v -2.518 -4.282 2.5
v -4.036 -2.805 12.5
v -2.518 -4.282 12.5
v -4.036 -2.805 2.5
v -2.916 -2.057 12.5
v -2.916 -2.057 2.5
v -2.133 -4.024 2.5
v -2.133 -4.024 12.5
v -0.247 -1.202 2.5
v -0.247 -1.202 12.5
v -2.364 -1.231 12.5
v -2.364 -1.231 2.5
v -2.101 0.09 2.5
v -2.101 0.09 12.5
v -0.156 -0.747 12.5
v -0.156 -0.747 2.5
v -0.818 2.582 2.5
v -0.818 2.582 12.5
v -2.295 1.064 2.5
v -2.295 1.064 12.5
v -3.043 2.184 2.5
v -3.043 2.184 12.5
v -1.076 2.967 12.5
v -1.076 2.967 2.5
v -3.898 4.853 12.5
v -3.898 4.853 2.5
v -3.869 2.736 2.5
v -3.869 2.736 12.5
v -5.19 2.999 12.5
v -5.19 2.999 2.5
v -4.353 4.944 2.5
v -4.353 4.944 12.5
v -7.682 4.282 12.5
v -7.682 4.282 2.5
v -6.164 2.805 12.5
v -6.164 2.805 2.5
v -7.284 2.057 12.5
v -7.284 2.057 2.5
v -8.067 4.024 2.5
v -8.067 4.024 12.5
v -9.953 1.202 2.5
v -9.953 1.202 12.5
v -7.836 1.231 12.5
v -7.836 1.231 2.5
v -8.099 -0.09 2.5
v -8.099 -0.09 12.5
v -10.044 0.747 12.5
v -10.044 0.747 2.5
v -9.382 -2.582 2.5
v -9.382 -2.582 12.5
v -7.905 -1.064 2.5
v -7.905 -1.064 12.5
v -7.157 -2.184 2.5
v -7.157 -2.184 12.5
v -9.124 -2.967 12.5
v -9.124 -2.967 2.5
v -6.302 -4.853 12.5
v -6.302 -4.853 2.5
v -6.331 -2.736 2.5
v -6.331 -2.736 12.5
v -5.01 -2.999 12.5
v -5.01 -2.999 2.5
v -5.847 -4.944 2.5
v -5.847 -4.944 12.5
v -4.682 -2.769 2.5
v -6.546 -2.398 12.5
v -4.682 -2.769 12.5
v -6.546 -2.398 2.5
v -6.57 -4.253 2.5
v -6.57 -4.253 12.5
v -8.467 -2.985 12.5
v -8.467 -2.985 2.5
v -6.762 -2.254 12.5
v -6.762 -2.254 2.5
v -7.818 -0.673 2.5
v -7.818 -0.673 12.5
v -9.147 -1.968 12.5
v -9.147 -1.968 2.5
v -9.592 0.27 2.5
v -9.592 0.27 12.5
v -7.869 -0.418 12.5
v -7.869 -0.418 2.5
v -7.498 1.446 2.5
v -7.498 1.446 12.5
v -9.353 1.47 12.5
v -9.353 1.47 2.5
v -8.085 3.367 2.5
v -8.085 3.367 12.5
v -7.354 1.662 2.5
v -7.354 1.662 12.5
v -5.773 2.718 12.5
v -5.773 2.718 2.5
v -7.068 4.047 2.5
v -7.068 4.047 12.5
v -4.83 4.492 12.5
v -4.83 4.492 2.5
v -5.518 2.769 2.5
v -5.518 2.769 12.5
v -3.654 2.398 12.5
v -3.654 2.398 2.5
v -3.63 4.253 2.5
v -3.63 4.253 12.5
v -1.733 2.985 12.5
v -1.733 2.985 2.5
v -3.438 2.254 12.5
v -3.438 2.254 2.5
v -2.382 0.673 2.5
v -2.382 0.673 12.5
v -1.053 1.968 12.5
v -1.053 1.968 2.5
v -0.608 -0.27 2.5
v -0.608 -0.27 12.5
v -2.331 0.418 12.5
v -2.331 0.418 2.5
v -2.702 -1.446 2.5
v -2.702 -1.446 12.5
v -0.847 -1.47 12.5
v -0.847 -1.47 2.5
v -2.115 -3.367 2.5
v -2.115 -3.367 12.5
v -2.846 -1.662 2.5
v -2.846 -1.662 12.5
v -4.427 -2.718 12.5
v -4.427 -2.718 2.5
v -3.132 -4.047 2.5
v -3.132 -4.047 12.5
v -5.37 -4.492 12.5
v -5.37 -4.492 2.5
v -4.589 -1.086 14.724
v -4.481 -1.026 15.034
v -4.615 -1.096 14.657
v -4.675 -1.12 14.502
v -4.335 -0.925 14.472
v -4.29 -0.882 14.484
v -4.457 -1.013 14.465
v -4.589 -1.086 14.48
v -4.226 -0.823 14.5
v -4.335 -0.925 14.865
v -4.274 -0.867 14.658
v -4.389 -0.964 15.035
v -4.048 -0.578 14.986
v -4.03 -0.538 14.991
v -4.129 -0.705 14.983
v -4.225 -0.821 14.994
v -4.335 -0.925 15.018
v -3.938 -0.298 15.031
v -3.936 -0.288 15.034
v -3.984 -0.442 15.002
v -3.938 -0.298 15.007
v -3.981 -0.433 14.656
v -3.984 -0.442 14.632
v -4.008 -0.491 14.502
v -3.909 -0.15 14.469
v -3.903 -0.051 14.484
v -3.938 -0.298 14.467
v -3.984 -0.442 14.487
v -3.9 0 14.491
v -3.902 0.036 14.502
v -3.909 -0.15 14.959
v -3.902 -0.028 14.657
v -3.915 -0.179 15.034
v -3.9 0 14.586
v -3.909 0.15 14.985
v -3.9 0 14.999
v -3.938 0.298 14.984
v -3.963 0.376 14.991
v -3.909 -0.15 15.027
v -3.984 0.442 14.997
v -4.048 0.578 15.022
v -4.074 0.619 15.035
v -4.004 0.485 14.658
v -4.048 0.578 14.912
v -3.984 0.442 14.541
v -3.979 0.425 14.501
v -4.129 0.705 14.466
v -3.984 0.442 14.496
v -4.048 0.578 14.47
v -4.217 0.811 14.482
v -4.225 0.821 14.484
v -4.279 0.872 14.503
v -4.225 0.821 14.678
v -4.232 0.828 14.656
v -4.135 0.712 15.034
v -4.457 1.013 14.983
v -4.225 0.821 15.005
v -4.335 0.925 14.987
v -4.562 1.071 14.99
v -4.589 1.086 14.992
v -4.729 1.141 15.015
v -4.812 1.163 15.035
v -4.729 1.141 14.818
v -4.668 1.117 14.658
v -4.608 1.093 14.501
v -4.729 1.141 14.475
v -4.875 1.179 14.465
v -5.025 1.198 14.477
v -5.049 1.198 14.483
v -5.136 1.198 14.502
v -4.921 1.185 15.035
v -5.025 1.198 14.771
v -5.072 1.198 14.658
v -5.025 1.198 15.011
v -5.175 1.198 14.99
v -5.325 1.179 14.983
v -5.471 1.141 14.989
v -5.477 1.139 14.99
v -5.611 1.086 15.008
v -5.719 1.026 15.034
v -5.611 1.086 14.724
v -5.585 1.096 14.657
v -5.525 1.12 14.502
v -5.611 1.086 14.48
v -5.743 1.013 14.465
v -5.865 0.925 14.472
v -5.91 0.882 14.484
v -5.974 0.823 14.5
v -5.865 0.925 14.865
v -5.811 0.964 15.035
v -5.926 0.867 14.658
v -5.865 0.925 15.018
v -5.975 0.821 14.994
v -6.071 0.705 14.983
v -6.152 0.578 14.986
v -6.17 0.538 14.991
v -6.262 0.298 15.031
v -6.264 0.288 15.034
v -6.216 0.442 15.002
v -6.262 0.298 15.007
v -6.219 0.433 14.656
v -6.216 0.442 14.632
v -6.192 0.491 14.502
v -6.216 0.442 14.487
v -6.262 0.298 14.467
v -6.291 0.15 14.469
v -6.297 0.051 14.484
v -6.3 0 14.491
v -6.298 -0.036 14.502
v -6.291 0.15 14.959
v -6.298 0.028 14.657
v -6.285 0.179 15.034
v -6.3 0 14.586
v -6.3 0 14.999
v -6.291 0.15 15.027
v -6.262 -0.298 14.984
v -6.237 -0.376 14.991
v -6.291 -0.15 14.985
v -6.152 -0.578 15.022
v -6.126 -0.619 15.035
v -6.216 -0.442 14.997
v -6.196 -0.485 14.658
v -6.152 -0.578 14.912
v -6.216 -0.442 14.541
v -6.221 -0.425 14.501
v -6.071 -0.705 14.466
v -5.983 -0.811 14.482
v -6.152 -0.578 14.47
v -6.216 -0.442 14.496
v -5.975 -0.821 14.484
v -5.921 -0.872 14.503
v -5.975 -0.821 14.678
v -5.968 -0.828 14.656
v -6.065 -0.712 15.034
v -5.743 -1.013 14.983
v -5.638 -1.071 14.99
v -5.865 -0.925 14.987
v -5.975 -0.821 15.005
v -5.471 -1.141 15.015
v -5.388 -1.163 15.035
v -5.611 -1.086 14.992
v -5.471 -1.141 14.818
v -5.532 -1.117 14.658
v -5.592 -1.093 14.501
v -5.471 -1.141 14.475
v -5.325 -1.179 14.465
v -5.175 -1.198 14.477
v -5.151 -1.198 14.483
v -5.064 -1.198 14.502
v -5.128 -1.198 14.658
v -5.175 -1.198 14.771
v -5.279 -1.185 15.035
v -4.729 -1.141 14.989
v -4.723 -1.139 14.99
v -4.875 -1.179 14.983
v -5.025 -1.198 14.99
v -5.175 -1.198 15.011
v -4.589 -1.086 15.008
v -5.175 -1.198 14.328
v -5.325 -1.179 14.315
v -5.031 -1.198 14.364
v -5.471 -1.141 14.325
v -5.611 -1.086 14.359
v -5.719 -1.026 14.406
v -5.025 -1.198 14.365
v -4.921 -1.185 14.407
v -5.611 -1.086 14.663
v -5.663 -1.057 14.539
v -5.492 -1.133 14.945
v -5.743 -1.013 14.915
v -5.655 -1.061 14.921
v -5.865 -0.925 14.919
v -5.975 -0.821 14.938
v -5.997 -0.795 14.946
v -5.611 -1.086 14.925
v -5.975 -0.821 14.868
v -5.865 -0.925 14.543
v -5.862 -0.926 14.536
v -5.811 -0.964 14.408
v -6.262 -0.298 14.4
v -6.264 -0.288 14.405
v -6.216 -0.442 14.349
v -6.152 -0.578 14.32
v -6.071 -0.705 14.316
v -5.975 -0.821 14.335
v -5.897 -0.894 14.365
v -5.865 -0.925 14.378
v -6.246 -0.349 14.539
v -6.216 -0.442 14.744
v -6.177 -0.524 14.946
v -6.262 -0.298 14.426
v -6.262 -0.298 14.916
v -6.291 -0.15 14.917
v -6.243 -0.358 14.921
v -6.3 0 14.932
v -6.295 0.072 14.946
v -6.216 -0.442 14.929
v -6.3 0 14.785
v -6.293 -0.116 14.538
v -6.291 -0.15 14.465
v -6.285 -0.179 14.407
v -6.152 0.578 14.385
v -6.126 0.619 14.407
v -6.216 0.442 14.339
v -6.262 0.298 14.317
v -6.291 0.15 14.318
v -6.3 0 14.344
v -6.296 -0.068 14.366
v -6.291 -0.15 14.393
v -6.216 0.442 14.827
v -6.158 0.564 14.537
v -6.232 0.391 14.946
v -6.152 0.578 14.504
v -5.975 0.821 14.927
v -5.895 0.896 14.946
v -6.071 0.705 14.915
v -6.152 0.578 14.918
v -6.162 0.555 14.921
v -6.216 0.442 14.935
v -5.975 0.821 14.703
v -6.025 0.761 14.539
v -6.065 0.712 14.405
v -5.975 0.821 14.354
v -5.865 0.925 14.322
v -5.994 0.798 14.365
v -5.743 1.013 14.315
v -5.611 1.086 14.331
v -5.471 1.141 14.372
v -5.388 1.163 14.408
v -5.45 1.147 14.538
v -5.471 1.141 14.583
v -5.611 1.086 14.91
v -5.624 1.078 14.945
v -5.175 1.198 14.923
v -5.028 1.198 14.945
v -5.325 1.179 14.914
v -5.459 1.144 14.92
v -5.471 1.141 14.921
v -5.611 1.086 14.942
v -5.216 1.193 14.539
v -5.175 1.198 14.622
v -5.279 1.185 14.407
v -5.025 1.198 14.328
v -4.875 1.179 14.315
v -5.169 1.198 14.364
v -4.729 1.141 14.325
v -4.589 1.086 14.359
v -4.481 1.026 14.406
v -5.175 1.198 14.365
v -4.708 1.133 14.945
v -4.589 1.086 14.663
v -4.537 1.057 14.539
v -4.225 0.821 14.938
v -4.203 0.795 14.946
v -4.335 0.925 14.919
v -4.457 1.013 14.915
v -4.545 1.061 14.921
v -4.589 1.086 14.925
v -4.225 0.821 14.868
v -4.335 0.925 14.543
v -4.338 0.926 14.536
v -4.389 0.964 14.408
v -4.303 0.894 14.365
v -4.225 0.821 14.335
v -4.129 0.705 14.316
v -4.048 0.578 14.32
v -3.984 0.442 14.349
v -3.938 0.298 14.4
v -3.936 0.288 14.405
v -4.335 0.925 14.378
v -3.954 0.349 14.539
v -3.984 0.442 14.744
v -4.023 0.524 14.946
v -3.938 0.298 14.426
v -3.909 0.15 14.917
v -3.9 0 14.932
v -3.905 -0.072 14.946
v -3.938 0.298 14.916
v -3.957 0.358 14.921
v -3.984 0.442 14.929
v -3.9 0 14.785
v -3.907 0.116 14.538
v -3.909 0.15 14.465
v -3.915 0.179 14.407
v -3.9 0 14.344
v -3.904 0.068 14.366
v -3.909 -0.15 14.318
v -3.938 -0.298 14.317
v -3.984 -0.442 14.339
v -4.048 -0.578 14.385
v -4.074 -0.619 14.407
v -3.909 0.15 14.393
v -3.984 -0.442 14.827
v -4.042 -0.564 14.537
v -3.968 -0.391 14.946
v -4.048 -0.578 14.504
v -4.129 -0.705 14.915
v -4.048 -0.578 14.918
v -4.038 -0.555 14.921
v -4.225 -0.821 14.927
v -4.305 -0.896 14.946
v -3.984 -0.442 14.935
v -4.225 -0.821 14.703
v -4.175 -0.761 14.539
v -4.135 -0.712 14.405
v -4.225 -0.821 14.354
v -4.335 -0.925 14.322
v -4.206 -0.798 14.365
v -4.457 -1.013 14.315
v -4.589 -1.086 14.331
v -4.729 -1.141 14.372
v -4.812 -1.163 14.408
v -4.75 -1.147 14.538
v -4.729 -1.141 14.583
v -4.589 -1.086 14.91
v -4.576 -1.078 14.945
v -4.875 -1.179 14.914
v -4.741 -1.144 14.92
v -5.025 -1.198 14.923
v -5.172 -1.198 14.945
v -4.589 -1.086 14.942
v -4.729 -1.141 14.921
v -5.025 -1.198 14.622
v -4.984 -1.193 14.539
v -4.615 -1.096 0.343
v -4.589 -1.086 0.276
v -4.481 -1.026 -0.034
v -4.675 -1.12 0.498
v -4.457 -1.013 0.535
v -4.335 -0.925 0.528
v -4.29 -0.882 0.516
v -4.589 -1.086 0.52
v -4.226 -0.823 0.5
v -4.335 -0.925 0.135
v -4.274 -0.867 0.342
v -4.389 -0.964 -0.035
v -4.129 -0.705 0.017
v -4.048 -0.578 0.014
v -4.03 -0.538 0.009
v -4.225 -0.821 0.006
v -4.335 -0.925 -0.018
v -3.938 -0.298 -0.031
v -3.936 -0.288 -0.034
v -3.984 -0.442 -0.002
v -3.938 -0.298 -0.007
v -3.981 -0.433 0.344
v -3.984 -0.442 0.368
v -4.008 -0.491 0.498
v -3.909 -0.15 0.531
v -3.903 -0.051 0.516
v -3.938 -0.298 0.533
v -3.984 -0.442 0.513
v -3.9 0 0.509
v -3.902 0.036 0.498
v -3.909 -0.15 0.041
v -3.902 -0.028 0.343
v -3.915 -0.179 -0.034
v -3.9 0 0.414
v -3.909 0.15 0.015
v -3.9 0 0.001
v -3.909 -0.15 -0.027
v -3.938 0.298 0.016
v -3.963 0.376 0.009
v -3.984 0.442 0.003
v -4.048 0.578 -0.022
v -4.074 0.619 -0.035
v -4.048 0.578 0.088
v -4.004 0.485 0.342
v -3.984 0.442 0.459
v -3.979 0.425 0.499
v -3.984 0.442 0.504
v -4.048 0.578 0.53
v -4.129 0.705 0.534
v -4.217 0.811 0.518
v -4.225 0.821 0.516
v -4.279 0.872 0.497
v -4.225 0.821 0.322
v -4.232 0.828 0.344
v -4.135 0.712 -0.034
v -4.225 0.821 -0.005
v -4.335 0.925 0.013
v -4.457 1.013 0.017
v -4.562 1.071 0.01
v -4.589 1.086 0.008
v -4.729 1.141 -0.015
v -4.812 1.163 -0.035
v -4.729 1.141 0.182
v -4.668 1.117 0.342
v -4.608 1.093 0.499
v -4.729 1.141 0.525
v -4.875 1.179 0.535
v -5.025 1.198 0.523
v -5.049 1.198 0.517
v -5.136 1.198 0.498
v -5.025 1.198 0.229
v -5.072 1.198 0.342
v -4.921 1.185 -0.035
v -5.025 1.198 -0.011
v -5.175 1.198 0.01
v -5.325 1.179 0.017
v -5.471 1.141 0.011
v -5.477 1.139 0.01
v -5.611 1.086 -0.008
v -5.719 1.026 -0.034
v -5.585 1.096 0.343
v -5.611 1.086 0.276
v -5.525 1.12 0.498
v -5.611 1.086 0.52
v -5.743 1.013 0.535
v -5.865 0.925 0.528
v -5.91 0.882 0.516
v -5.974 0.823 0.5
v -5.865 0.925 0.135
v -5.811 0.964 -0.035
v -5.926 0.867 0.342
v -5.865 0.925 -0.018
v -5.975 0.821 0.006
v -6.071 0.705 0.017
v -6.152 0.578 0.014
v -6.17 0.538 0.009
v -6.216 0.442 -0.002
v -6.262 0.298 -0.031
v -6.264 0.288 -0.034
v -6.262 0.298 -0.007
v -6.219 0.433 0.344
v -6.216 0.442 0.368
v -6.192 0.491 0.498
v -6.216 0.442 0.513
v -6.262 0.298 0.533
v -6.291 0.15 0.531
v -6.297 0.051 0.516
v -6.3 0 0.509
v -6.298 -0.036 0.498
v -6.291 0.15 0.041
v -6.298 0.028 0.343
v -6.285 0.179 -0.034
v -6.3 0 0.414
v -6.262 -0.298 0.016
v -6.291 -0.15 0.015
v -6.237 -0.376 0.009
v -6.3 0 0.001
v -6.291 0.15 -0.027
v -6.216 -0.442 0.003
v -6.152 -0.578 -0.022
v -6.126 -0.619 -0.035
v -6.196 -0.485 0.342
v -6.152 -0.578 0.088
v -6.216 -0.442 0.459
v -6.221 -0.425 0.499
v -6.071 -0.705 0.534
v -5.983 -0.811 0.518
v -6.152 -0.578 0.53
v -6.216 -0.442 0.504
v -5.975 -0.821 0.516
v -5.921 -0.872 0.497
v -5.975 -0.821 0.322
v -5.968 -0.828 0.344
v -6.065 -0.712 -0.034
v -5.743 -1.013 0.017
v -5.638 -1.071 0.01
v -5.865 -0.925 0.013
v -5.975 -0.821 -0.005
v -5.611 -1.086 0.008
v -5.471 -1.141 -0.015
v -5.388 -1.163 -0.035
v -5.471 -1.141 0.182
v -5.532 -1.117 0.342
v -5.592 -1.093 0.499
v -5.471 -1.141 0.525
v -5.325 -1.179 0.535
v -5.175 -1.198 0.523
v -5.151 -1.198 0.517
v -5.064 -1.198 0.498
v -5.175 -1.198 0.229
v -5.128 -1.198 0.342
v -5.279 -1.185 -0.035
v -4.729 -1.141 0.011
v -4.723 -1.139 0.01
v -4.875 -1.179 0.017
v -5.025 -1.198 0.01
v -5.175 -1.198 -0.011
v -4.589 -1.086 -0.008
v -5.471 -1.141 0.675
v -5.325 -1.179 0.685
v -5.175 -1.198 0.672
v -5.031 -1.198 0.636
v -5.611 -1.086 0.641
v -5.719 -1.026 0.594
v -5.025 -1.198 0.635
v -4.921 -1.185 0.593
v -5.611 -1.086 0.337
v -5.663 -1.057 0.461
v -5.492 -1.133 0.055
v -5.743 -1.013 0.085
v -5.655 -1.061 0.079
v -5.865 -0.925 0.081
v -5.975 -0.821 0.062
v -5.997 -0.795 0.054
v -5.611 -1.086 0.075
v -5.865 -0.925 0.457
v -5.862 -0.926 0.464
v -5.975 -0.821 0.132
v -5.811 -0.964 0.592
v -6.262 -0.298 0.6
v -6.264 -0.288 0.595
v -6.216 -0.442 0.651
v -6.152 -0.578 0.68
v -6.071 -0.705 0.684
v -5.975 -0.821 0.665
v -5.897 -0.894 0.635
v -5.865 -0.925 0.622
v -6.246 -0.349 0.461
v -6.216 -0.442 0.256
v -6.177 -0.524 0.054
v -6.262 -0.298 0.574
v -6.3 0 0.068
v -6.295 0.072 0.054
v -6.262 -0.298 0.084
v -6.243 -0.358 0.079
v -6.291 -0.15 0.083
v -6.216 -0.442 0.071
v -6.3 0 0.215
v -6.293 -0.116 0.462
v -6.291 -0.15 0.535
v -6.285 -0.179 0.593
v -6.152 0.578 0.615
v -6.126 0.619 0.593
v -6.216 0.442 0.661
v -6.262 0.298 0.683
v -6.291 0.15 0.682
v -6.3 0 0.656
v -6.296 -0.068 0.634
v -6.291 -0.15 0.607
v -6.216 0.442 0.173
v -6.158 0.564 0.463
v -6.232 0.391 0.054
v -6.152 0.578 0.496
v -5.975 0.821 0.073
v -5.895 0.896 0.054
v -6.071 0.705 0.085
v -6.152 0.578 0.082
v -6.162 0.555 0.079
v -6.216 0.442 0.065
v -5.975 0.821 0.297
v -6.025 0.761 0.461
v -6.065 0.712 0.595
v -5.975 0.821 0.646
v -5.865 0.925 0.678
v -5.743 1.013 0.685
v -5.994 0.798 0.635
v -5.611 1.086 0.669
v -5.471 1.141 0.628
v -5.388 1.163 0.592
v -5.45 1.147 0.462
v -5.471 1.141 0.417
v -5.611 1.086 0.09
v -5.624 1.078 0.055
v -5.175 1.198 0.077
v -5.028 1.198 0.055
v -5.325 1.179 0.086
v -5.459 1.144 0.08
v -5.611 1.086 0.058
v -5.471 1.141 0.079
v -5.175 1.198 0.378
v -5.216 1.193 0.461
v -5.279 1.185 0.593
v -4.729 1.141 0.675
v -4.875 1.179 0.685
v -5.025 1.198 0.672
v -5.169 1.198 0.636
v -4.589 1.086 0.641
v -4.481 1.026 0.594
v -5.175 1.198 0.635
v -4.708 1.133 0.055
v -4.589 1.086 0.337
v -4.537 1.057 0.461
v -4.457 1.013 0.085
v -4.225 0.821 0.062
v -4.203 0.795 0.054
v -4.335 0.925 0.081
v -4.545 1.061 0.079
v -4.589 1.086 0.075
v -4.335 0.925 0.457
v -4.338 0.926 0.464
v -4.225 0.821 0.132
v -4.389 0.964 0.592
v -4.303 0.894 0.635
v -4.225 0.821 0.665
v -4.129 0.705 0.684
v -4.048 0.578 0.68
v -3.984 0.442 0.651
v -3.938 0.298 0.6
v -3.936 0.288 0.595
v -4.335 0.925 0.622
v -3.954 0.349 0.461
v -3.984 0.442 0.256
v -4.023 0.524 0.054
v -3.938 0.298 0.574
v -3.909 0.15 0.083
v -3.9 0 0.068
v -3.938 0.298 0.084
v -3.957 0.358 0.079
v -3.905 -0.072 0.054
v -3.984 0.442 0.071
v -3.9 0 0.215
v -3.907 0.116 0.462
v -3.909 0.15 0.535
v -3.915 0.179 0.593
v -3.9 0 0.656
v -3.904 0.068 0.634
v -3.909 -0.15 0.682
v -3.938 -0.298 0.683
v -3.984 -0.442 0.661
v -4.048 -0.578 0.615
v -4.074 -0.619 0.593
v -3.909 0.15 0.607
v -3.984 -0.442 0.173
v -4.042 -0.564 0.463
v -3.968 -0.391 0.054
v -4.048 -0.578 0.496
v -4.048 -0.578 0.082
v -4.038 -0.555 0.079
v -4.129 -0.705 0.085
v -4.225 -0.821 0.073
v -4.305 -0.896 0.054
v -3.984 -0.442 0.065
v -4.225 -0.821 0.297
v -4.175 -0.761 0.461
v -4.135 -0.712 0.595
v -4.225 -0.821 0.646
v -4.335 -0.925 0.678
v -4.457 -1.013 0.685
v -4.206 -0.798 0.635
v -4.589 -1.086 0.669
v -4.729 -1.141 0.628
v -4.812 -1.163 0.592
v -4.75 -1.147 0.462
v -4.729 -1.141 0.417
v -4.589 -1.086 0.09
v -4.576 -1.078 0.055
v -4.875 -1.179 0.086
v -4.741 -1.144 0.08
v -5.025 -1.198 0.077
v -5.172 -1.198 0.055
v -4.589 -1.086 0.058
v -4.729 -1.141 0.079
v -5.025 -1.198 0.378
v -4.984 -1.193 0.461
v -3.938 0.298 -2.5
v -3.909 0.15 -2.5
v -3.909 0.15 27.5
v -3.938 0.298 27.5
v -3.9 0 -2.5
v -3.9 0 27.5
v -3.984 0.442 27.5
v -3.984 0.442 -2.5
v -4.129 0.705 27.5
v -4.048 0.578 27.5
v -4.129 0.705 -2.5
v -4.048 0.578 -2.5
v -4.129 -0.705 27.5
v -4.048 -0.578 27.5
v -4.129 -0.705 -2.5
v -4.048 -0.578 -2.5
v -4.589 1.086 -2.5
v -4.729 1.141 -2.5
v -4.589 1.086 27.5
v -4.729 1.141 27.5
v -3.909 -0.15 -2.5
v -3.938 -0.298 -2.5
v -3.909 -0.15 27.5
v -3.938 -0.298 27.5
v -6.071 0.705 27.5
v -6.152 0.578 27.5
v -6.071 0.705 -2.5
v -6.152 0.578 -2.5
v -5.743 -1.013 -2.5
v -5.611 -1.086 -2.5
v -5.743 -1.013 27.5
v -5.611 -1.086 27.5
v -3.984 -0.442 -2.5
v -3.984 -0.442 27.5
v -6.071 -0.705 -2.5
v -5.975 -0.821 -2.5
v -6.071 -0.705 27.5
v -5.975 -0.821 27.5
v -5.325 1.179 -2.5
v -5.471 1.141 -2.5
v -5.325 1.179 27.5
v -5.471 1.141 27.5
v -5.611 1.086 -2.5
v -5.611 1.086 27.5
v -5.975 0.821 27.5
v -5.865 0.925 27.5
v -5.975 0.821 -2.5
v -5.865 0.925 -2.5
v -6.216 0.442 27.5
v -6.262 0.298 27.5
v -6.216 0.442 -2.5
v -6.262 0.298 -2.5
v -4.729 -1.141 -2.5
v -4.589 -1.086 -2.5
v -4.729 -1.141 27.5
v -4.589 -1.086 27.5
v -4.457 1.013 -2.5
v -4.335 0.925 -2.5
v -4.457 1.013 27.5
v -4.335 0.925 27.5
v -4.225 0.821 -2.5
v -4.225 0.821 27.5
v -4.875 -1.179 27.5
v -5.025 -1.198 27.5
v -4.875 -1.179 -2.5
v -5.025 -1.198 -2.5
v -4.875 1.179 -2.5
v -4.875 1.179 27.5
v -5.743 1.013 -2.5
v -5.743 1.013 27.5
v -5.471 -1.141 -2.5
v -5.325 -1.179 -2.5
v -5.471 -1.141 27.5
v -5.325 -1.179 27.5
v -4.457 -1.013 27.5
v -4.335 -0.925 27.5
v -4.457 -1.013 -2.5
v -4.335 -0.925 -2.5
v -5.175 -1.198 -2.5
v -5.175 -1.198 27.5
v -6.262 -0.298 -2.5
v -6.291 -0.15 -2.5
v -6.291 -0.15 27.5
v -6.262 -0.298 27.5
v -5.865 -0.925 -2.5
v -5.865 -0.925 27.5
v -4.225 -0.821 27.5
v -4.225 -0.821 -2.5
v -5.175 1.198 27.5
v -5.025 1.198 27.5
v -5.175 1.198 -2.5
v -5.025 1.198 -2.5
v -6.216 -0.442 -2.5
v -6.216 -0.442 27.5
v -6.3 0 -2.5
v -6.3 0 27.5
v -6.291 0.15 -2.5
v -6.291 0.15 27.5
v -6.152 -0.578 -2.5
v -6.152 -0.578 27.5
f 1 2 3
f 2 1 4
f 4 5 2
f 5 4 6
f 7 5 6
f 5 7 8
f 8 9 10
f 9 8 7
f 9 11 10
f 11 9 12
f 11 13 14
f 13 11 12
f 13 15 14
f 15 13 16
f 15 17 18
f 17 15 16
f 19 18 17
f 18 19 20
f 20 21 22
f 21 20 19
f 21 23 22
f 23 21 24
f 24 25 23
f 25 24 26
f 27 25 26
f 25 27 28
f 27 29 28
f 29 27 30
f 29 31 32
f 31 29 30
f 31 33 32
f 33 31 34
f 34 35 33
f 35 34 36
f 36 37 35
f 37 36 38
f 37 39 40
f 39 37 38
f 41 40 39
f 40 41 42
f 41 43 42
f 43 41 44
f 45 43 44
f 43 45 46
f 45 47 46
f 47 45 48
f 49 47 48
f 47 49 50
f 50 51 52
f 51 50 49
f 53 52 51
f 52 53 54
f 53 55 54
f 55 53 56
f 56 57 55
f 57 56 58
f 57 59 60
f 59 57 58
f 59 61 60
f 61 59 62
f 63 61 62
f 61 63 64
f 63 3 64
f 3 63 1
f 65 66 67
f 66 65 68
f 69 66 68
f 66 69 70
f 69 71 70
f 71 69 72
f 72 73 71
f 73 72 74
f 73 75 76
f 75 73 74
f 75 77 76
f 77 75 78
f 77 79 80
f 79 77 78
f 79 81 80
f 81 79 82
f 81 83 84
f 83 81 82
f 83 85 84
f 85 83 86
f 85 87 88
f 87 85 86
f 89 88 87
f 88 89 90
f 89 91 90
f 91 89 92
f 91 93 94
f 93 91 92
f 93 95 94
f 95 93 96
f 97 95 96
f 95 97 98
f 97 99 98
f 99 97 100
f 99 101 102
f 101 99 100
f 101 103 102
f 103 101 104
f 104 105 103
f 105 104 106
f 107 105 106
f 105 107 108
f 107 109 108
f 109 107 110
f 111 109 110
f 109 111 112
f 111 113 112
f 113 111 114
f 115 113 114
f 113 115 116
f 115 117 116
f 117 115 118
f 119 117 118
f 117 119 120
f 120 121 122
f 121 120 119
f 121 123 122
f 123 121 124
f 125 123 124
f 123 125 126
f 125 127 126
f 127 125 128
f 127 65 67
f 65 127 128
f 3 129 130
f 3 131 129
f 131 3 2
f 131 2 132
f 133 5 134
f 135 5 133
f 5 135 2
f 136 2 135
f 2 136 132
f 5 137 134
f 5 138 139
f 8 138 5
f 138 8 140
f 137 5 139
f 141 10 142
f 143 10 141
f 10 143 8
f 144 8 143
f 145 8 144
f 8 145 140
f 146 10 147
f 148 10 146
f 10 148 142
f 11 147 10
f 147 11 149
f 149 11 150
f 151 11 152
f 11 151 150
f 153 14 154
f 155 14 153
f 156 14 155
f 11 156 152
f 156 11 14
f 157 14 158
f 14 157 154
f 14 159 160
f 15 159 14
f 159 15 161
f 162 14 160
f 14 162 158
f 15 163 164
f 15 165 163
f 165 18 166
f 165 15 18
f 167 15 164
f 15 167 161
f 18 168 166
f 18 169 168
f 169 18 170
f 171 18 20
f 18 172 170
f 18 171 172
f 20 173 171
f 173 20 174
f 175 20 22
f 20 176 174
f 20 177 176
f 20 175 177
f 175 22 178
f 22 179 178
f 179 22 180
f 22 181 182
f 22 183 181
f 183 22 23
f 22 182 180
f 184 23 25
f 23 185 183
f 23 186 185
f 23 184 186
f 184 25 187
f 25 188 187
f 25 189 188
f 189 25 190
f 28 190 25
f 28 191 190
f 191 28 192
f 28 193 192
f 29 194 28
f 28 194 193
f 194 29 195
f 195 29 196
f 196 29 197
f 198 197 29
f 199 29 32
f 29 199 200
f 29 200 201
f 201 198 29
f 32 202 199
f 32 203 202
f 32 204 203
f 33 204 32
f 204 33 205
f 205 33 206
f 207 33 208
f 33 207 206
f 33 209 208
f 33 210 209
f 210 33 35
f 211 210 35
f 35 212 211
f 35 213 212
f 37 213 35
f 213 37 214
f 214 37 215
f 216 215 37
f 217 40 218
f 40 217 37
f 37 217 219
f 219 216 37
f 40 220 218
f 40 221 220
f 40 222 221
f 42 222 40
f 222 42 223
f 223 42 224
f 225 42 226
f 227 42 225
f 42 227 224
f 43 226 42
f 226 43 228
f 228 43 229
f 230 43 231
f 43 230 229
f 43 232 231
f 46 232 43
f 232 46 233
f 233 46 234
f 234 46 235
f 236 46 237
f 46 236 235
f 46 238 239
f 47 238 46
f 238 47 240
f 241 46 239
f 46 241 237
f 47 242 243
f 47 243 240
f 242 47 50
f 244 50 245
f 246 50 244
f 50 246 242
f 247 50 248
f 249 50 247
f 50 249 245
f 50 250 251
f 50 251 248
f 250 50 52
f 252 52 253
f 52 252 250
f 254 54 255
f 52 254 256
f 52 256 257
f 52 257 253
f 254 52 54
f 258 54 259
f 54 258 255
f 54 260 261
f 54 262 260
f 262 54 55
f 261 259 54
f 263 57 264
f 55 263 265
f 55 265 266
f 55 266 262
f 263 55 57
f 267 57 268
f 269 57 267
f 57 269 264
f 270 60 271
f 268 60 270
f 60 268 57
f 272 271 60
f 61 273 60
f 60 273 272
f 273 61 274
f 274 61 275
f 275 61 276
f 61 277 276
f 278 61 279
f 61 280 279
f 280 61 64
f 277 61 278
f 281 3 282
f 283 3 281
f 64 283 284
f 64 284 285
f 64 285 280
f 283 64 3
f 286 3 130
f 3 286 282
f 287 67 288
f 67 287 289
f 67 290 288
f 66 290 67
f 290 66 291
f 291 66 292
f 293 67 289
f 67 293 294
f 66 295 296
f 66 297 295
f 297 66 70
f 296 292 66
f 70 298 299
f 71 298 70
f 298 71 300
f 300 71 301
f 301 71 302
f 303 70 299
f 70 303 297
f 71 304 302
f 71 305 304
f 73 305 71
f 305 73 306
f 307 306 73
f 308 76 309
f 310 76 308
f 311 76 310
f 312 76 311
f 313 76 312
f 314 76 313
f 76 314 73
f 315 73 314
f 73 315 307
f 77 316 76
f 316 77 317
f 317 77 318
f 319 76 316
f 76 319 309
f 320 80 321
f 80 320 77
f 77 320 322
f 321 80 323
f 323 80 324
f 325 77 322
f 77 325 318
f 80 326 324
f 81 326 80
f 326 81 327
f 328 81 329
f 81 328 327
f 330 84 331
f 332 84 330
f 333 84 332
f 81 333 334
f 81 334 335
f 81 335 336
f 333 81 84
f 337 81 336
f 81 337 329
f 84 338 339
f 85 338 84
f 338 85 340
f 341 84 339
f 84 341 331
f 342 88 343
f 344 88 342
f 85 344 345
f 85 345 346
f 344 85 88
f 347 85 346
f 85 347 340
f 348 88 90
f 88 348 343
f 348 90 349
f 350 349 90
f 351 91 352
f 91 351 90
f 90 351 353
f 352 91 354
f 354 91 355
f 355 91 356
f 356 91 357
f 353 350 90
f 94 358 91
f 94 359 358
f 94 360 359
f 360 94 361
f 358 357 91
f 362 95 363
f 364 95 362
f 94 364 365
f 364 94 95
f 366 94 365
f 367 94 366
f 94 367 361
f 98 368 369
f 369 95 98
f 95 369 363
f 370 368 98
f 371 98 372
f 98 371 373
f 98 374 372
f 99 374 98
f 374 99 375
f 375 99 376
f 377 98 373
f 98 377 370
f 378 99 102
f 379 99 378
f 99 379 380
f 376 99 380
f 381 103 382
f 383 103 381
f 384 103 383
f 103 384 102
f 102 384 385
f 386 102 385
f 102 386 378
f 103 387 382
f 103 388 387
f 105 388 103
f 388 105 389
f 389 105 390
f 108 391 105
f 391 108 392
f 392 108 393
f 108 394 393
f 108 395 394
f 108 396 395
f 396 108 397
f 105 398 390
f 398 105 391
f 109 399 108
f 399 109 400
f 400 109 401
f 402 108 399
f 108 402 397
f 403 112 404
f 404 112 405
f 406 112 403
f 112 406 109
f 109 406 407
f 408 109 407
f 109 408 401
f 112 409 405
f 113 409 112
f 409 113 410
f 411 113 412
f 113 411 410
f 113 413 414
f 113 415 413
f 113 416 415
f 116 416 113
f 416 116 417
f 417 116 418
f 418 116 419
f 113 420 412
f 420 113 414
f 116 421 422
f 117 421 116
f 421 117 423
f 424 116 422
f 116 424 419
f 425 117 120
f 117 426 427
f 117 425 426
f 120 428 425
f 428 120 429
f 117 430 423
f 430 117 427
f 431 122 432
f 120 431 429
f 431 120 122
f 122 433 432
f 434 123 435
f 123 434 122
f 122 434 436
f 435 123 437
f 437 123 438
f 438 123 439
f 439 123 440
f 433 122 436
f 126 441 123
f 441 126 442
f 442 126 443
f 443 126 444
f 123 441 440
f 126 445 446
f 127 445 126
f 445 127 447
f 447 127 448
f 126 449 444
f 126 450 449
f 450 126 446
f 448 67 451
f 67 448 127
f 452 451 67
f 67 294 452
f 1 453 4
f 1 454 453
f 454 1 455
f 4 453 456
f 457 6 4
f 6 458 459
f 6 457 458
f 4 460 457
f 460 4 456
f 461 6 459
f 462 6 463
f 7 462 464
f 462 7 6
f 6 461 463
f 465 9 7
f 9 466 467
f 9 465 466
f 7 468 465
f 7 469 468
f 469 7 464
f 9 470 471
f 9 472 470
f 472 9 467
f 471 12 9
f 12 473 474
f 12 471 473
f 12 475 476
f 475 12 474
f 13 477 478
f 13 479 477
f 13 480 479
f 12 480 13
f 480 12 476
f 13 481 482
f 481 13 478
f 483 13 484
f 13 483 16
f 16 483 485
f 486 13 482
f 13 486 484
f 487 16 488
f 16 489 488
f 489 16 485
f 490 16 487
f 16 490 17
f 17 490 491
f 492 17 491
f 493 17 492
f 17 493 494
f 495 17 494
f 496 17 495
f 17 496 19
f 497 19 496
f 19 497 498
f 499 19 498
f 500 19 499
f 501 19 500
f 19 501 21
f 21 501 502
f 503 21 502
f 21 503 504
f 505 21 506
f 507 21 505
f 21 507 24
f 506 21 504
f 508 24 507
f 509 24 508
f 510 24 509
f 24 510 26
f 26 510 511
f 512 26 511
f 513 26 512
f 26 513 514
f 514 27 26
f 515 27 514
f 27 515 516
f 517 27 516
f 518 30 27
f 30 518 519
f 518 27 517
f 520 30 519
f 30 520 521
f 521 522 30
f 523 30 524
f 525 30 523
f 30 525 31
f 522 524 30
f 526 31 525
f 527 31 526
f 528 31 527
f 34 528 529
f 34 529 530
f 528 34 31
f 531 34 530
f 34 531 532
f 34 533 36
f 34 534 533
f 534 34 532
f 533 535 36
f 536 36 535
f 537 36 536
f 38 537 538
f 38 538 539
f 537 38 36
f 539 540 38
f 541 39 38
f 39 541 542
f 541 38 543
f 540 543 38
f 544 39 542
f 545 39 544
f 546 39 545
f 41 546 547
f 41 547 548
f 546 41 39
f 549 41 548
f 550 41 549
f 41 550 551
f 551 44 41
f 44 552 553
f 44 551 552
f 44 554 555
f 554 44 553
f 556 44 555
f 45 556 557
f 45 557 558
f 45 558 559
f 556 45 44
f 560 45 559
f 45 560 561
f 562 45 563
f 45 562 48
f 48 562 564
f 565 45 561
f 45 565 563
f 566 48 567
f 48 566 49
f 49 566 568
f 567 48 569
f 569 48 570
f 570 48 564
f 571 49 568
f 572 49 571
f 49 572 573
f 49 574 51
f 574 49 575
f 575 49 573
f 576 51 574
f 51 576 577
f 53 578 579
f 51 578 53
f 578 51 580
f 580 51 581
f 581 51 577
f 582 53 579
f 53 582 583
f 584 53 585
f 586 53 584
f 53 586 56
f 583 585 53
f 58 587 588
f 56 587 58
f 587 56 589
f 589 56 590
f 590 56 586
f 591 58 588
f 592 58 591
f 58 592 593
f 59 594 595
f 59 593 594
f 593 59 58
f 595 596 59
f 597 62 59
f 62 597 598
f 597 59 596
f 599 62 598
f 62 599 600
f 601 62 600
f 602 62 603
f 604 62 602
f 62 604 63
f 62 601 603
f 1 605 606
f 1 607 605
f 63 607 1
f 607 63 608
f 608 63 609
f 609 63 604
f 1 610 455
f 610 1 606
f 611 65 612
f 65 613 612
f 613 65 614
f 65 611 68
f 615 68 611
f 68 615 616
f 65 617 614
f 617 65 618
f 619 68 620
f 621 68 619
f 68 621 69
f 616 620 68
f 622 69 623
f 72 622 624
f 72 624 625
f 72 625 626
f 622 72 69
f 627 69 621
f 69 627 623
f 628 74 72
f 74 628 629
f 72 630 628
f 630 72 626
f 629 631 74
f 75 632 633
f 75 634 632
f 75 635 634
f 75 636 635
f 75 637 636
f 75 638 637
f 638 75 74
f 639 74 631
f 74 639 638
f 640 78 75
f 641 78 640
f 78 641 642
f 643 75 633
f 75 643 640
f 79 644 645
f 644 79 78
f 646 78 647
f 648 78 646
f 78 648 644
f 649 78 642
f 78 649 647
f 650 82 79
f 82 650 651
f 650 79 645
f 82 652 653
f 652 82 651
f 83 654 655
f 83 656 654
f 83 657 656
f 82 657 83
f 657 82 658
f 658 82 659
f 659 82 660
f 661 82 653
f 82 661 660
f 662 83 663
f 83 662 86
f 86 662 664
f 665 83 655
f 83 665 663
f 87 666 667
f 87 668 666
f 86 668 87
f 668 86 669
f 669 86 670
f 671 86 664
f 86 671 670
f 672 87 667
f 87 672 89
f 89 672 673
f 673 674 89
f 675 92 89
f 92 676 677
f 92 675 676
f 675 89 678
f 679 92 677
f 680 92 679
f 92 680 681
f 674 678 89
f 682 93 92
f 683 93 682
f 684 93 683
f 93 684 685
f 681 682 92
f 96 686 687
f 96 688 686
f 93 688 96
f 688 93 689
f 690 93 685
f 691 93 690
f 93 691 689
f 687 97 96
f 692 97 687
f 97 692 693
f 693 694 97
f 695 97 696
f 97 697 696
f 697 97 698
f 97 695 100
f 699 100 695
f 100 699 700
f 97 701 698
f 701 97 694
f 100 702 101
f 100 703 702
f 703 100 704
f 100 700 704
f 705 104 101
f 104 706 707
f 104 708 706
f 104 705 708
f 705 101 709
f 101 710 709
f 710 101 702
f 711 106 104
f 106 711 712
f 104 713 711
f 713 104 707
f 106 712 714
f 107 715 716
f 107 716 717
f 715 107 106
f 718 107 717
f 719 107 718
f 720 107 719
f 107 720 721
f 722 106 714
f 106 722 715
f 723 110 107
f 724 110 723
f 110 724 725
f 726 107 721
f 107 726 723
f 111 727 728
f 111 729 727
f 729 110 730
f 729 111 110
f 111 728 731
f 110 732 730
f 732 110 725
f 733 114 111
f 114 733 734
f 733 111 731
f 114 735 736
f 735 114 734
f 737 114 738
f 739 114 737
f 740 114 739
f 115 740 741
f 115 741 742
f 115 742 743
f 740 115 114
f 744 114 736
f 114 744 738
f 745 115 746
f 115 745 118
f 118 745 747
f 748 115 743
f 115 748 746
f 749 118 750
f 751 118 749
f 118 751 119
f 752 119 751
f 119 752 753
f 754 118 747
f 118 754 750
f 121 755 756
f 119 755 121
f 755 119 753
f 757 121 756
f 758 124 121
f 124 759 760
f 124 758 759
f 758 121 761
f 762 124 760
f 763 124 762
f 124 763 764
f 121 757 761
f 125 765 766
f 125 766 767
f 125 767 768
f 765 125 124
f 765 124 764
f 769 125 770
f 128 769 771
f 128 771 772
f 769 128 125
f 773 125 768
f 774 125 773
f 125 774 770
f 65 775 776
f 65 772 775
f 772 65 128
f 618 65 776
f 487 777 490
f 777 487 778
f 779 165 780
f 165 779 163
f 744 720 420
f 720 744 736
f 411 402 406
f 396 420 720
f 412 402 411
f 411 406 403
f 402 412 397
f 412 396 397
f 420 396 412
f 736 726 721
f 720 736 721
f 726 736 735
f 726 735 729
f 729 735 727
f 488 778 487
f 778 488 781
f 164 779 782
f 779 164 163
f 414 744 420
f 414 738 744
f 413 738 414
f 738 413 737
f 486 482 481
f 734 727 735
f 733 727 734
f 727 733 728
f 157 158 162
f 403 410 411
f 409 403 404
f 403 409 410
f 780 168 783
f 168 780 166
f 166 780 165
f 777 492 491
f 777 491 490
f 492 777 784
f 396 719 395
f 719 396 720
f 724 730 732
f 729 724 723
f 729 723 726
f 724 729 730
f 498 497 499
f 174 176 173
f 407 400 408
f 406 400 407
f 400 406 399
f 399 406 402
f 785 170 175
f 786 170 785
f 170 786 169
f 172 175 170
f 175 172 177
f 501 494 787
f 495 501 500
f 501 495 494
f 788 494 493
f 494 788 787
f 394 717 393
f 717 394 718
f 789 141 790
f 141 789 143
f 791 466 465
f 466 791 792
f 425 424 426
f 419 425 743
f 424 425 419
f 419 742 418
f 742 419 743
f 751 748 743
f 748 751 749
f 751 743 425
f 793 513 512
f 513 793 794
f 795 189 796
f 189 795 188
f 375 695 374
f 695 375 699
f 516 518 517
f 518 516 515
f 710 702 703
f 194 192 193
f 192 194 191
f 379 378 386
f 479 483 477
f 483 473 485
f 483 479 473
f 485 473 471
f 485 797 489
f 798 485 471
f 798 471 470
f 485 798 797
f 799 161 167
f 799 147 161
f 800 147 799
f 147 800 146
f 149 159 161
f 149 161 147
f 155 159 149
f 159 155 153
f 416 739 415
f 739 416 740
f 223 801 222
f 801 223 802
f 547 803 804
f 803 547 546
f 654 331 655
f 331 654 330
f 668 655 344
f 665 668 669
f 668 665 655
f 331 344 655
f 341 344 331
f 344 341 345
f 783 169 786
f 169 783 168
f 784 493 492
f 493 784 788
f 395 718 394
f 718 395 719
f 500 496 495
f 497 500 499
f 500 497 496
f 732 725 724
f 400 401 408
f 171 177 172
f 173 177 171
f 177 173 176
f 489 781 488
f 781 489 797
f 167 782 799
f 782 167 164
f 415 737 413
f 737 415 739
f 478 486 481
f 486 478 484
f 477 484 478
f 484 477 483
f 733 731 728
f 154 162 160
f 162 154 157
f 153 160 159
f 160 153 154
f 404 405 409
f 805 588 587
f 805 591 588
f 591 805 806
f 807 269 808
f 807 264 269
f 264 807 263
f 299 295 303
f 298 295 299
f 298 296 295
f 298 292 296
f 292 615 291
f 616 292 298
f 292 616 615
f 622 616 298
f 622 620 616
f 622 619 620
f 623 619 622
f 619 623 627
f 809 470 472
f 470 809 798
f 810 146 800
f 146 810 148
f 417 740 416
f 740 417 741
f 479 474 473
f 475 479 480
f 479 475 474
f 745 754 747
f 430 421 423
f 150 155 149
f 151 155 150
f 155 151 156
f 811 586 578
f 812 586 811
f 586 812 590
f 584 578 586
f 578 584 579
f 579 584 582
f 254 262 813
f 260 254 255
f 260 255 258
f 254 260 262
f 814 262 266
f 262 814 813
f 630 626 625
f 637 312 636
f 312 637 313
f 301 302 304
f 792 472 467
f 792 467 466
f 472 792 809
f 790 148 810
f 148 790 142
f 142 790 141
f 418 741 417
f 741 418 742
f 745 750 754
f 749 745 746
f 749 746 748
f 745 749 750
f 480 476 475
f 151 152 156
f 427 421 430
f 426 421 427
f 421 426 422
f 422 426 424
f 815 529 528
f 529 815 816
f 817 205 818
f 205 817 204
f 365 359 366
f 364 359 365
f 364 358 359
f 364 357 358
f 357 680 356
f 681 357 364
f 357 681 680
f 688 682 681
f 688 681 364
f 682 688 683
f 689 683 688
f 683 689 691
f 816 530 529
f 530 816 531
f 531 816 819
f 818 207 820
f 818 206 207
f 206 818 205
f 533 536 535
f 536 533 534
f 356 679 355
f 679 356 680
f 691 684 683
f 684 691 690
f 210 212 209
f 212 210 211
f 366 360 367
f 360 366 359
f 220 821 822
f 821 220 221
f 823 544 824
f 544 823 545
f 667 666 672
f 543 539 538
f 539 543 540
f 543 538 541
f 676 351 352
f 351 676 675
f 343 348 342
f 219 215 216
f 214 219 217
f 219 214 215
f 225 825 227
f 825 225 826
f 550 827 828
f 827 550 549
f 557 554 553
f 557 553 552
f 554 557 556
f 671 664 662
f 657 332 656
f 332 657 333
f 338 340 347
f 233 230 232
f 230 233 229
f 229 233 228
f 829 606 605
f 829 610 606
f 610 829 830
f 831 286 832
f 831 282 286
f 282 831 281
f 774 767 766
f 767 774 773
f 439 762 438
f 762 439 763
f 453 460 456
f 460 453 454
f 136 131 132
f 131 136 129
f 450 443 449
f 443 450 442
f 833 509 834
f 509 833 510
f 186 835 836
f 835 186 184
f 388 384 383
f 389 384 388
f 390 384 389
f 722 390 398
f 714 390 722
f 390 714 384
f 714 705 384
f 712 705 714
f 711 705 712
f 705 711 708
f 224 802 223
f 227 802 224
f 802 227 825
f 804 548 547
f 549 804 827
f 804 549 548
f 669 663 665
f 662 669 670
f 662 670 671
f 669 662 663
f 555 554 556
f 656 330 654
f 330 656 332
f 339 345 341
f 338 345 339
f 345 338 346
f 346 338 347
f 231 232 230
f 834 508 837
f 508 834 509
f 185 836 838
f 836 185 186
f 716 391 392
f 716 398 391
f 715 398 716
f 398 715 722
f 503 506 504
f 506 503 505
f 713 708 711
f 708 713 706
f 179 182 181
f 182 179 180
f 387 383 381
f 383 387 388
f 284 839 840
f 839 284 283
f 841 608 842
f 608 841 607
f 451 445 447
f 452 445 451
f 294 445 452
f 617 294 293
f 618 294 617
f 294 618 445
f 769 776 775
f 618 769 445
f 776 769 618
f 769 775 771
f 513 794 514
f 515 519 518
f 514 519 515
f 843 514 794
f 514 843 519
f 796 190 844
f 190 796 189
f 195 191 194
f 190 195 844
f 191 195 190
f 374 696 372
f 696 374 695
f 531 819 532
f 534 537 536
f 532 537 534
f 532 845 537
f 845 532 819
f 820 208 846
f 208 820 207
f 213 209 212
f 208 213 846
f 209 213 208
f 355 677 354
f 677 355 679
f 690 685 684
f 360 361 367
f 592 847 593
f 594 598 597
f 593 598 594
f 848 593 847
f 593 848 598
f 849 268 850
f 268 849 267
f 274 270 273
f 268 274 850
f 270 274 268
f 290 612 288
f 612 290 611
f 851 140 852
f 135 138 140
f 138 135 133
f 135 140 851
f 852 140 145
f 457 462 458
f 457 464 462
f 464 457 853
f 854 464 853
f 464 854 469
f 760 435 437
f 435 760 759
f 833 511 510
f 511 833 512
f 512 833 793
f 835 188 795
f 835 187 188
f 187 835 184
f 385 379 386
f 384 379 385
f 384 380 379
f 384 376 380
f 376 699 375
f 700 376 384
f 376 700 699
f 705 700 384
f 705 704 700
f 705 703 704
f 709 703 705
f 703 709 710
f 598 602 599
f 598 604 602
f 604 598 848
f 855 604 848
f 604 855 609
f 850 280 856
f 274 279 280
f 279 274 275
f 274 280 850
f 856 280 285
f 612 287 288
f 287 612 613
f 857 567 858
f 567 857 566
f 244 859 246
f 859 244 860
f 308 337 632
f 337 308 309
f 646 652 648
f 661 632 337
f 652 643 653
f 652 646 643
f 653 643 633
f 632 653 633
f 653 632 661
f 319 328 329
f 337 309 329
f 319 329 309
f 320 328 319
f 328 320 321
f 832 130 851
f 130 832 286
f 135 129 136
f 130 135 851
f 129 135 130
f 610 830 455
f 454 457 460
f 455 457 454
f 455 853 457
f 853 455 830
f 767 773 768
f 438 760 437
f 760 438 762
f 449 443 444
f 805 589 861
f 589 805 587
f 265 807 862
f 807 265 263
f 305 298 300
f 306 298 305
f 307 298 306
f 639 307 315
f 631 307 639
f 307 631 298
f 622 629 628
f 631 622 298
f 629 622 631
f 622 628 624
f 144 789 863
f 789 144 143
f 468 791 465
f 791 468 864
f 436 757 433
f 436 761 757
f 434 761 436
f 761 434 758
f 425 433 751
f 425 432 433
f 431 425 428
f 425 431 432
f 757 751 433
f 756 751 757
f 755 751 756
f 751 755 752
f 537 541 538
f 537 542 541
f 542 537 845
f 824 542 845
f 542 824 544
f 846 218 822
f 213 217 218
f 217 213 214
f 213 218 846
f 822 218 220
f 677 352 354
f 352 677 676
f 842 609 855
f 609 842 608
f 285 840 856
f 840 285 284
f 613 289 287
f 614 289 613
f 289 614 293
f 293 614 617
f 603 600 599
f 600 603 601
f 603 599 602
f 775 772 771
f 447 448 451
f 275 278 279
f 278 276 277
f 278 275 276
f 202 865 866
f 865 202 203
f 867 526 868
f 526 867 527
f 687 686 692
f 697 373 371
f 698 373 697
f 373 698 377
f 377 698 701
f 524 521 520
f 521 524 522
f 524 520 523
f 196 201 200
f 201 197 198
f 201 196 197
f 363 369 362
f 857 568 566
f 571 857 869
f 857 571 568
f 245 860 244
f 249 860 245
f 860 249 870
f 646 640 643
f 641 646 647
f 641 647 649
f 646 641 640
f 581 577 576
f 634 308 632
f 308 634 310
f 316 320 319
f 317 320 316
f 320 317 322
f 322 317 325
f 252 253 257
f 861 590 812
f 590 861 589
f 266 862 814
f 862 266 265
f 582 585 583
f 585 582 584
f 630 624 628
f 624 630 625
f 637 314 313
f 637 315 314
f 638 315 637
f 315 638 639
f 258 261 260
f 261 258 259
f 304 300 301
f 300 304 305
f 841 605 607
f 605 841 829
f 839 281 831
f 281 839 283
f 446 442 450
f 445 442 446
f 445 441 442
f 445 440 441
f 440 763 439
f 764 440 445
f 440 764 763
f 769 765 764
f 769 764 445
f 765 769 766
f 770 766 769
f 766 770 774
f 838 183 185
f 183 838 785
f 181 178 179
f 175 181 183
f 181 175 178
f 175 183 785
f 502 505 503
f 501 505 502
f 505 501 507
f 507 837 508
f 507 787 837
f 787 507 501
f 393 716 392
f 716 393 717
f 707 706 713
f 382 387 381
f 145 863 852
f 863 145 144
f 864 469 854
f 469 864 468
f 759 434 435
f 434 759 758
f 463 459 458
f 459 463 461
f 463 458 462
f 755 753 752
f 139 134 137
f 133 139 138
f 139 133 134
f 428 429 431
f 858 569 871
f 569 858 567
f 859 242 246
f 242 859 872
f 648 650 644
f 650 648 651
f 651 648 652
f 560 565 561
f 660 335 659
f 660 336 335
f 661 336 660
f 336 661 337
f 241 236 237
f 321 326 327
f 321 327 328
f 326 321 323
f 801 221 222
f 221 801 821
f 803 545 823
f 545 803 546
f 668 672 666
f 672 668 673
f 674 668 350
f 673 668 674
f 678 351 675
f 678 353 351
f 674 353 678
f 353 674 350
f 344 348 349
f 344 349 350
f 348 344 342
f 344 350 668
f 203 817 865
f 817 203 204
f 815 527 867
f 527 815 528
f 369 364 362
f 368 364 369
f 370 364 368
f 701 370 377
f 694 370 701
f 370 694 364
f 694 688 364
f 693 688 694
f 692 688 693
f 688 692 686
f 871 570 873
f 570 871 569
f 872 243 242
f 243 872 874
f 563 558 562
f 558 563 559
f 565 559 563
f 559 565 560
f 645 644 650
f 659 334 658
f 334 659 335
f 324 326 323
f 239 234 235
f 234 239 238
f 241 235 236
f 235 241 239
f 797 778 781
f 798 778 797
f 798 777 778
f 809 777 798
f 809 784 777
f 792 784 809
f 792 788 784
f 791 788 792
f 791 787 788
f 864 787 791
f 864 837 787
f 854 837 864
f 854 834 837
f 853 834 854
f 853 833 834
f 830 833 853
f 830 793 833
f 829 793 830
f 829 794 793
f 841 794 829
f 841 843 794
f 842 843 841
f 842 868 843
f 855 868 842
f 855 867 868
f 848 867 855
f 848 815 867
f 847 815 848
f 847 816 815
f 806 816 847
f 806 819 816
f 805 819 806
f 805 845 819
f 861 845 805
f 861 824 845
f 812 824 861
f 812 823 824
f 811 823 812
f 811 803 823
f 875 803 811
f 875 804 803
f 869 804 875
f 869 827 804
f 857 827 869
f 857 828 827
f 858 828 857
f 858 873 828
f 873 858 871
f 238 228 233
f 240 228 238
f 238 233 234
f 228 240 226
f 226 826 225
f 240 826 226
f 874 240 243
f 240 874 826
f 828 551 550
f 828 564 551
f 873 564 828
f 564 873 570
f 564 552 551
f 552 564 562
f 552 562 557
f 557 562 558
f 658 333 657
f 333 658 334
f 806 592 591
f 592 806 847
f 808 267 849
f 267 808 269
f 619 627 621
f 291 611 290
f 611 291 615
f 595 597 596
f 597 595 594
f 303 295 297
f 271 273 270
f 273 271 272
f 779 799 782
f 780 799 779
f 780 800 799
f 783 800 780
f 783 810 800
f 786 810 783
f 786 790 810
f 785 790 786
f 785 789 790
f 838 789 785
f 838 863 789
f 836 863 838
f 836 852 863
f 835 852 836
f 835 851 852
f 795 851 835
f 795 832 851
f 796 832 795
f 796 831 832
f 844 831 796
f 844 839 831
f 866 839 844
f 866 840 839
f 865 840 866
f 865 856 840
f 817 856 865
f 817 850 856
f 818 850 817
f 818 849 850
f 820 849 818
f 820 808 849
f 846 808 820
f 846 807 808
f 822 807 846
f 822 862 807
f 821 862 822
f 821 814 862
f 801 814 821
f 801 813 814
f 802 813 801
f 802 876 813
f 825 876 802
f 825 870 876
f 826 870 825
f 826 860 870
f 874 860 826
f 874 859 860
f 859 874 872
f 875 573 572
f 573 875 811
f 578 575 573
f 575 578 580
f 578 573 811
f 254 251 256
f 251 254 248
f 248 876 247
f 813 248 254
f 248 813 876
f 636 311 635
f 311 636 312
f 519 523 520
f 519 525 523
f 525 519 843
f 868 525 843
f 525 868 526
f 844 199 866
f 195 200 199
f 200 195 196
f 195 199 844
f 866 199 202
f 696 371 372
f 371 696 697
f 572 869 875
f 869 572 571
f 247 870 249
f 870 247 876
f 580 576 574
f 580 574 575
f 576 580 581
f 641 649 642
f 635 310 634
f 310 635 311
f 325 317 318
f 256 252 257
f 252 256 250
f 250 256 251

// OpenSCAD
module squish() {
polygon( points=[
[2.9986501012469624, 0.08998650060748697],[4.943855389680211, -0.747190662367996],[4.28158931891503, 2.5822457094848144],[2.8048277966239628, 1.06439702709354],[2.056735756202653, 2.183995885792256],[2.056735756202653, 2.183995885792256],[4.024177255448217, 2.9674900870488607],[1.2016173897941294, 4.8534642935272885],[1.2306703993206836, 2.73595511078597],[-0.08998650060748688, 2.9986501012469624],[-0.08998650060748688, 2.9986501012469624],[0.7471906623679959, 4.943855389680211],[-2.582245709484814, 4.28158931891503],[-1.0643970270935397, 2.804827796623963],[-2.1839958857922555, 2.0567357562026536],[-2.1839958857922555, 2.0567357562026536],[-2.9674900870488607, 4.024177255448217],[-4.8534642935272885, 1.2016173897941298],[-2.7359551107859703, 1.2306703993206831],[-2.9986501012469624, -0.08998650060748603],[-2.9986501012469624, -0.08998650060748603],[-4.943855389680211, 0.7471906623679963],[-4.28158931891503, -2.582245709484814],[-2.8048277966239628, -1.06439702709354],[-2.056735756202654, -2.183995885792255],[-2.056735756202654, -2.183995885792255],[-4.024177255448217, -2.9674900870488607],[-1.20161738979413, -4.8534642935272885],[-1.2306703993206858, -2.7359551107859694],[0.08998650060748718, -2.9986501012469624],[0.08998650060748718, -2.9986501012469624],[-0.7471906623679987, -4.943855389680211],[2.582245709484817, -4.281589318915028],[1.06439702709354, -2.8048277966239628],[2.183995885792256, -2.056735756202653],[2.183995885792256, -2.056735756202653],[2.9674900870488585, -4.024177255448219],[4.8534642935272885, -1.2016173897941302],[2.735955110785969, -1.2306703993206858],[2.9986501012469624, 0.08998650060748699],[2.7685590182209183, 0.4184267709260778],[4.491902429708419, -0.26983802915750066],[4.046714173664704, 1.9682744718817027],[2.7179400043752815, 0.672905738284712],[1.661794448747362, 2.2535392630510014],[1.661794448747362, 2.2535392630510014],[3.3670589687144346, 2.9854503682358695],[1.4696788074181053, 4.253239260025951],[1.446057597311496, 2.3976900185924164],[-0.4184267709260774, 2.7685590182209183],[-0.4184267709260774, 2.7685590182209183],[0.2698380291575012, 4.491902429708419],[-1.9682744718817027, 4.046714173664704],[-0.6729057382847121, 2.7179400043752815],[-2.253539263051001, 1.6617944487473622],[-2.253539263051001, 1.6617944487473622],[-2.985450368235869, 3.3670589687144346],[-4.253239260025951, 1.4696788074181057],[-2.3976900185924164, 1.4460575973114964],[-2.7685590182209183, -0.4184267709260772],[-2.7685590182209183, -0.4184267709260772],[-4.491902429708419, 0.2698380291575015],[-4.046714173664704, -1.9682744718817025],[-2.7179400043752815, -0.672905738284712],[-1.6617944487473617, -2.253539263051002],[-1.6617944487473617, -2.253539263051002],[-3.3670589687144346, -2.985450368235869],[-1.4696788074181097, -4.253239260025949],[-1.4460575973114984, -2.397690018592415],[0.4184267709260783, -2.7685590182209183],[0.4184267709260783, -2.7685590182209183],[-0.26983802915749977, -4.491902429708419],[1.9682744718817022, -4.046714173664704],[0.6729057382847118, -2.7179400043752815],[2.253539263051002, -1.6617944487473617],[2.253539263051002, -1.6617944487473617],[2.985450368235871, -3.3670589687144337],[4.253239260025949, -1.46967880741811],[2.3976900185924146, -1.4460575973114984],[2.7685590182209183, 0.4184267709260781],], paths=[
[
0,1,2,3,4,5,6,7,8,9,10,11,12,13,14,15,16,17,18,19,20,21,22,23,24,25,26,27,28,29,30,31,32,33,34,35,36,37,38,39,],
[
40,41,42,43,44,45,46,47,48,49,50,51,52,53,54,55,56,57,58,59,60,61,62,63,64,65,66,67,68,69,70,71,72,73,74,75,76,77,78,79,]
]);
}


module roller() {
	union() {
		linear_extrude( height=10 )
		squish();
		
		translate( [0,0,10] )
		linear_extrude( height=3, scale=0.1 )
		squish();
	
	
		scale( [1,1,-1] )
		translate( [0,0,0] )
		linear_extrude( height=3, scale=0.1 )
		squish();
	
		translate( [0,0,-5] )
		cylinder( r=1.2, h=30, $fn=50 );
	
	}
}





r = 5.1;
d = 4;
t = 2;
c = 0.5;
w = r*4 + t*2 + c*2;
s = 1;
b = 14;
g = 8;
h = t + g + b + s + t;
/*
difference() {
	union() {
		difference() {
			translate([0,d/2,2*r])
			rotate(90,[1,0,0])
			difference() {
				cylinder( r=2*r+c+t, h=d );
				translate([0,0,-1]) cylinder( r=2*r+c, h=d+2 );
			}
			translate([-50,-10,-t*2]) cube( [100,100,2*r+c+t] );
		}
	
		translate([-w/2,-d/2,-2]) {
			difference() {
				translate([0,0,0]) cube([w,d,h-10]);
				translate([t,-d/2,t]) cube([4*r+2*c, d+3, g+b+s]);
			}
		}
	}

	translate([-w/2,-d/2,-2]) {
		translate([w/2-r,4/2,-1]) cylinder(r=1.25,h=h+20,$fn=100);
		translate([w/2-r,4/2-1.7,t]) cylinder(r=1.15,h=h+20,$fn=100);
		translate([w/2+r,4/2,-1]) cylinder(r=1.25,h=h+20,$fn=100);
		translate([w/2+r,4/2-1.7,t]) cylinder(r=1.25,h=h+20,$fn=100);
	}
}
*/
translate([-r,0,2.5]) roller();
//translate([+r,0,2.5]) roller();
